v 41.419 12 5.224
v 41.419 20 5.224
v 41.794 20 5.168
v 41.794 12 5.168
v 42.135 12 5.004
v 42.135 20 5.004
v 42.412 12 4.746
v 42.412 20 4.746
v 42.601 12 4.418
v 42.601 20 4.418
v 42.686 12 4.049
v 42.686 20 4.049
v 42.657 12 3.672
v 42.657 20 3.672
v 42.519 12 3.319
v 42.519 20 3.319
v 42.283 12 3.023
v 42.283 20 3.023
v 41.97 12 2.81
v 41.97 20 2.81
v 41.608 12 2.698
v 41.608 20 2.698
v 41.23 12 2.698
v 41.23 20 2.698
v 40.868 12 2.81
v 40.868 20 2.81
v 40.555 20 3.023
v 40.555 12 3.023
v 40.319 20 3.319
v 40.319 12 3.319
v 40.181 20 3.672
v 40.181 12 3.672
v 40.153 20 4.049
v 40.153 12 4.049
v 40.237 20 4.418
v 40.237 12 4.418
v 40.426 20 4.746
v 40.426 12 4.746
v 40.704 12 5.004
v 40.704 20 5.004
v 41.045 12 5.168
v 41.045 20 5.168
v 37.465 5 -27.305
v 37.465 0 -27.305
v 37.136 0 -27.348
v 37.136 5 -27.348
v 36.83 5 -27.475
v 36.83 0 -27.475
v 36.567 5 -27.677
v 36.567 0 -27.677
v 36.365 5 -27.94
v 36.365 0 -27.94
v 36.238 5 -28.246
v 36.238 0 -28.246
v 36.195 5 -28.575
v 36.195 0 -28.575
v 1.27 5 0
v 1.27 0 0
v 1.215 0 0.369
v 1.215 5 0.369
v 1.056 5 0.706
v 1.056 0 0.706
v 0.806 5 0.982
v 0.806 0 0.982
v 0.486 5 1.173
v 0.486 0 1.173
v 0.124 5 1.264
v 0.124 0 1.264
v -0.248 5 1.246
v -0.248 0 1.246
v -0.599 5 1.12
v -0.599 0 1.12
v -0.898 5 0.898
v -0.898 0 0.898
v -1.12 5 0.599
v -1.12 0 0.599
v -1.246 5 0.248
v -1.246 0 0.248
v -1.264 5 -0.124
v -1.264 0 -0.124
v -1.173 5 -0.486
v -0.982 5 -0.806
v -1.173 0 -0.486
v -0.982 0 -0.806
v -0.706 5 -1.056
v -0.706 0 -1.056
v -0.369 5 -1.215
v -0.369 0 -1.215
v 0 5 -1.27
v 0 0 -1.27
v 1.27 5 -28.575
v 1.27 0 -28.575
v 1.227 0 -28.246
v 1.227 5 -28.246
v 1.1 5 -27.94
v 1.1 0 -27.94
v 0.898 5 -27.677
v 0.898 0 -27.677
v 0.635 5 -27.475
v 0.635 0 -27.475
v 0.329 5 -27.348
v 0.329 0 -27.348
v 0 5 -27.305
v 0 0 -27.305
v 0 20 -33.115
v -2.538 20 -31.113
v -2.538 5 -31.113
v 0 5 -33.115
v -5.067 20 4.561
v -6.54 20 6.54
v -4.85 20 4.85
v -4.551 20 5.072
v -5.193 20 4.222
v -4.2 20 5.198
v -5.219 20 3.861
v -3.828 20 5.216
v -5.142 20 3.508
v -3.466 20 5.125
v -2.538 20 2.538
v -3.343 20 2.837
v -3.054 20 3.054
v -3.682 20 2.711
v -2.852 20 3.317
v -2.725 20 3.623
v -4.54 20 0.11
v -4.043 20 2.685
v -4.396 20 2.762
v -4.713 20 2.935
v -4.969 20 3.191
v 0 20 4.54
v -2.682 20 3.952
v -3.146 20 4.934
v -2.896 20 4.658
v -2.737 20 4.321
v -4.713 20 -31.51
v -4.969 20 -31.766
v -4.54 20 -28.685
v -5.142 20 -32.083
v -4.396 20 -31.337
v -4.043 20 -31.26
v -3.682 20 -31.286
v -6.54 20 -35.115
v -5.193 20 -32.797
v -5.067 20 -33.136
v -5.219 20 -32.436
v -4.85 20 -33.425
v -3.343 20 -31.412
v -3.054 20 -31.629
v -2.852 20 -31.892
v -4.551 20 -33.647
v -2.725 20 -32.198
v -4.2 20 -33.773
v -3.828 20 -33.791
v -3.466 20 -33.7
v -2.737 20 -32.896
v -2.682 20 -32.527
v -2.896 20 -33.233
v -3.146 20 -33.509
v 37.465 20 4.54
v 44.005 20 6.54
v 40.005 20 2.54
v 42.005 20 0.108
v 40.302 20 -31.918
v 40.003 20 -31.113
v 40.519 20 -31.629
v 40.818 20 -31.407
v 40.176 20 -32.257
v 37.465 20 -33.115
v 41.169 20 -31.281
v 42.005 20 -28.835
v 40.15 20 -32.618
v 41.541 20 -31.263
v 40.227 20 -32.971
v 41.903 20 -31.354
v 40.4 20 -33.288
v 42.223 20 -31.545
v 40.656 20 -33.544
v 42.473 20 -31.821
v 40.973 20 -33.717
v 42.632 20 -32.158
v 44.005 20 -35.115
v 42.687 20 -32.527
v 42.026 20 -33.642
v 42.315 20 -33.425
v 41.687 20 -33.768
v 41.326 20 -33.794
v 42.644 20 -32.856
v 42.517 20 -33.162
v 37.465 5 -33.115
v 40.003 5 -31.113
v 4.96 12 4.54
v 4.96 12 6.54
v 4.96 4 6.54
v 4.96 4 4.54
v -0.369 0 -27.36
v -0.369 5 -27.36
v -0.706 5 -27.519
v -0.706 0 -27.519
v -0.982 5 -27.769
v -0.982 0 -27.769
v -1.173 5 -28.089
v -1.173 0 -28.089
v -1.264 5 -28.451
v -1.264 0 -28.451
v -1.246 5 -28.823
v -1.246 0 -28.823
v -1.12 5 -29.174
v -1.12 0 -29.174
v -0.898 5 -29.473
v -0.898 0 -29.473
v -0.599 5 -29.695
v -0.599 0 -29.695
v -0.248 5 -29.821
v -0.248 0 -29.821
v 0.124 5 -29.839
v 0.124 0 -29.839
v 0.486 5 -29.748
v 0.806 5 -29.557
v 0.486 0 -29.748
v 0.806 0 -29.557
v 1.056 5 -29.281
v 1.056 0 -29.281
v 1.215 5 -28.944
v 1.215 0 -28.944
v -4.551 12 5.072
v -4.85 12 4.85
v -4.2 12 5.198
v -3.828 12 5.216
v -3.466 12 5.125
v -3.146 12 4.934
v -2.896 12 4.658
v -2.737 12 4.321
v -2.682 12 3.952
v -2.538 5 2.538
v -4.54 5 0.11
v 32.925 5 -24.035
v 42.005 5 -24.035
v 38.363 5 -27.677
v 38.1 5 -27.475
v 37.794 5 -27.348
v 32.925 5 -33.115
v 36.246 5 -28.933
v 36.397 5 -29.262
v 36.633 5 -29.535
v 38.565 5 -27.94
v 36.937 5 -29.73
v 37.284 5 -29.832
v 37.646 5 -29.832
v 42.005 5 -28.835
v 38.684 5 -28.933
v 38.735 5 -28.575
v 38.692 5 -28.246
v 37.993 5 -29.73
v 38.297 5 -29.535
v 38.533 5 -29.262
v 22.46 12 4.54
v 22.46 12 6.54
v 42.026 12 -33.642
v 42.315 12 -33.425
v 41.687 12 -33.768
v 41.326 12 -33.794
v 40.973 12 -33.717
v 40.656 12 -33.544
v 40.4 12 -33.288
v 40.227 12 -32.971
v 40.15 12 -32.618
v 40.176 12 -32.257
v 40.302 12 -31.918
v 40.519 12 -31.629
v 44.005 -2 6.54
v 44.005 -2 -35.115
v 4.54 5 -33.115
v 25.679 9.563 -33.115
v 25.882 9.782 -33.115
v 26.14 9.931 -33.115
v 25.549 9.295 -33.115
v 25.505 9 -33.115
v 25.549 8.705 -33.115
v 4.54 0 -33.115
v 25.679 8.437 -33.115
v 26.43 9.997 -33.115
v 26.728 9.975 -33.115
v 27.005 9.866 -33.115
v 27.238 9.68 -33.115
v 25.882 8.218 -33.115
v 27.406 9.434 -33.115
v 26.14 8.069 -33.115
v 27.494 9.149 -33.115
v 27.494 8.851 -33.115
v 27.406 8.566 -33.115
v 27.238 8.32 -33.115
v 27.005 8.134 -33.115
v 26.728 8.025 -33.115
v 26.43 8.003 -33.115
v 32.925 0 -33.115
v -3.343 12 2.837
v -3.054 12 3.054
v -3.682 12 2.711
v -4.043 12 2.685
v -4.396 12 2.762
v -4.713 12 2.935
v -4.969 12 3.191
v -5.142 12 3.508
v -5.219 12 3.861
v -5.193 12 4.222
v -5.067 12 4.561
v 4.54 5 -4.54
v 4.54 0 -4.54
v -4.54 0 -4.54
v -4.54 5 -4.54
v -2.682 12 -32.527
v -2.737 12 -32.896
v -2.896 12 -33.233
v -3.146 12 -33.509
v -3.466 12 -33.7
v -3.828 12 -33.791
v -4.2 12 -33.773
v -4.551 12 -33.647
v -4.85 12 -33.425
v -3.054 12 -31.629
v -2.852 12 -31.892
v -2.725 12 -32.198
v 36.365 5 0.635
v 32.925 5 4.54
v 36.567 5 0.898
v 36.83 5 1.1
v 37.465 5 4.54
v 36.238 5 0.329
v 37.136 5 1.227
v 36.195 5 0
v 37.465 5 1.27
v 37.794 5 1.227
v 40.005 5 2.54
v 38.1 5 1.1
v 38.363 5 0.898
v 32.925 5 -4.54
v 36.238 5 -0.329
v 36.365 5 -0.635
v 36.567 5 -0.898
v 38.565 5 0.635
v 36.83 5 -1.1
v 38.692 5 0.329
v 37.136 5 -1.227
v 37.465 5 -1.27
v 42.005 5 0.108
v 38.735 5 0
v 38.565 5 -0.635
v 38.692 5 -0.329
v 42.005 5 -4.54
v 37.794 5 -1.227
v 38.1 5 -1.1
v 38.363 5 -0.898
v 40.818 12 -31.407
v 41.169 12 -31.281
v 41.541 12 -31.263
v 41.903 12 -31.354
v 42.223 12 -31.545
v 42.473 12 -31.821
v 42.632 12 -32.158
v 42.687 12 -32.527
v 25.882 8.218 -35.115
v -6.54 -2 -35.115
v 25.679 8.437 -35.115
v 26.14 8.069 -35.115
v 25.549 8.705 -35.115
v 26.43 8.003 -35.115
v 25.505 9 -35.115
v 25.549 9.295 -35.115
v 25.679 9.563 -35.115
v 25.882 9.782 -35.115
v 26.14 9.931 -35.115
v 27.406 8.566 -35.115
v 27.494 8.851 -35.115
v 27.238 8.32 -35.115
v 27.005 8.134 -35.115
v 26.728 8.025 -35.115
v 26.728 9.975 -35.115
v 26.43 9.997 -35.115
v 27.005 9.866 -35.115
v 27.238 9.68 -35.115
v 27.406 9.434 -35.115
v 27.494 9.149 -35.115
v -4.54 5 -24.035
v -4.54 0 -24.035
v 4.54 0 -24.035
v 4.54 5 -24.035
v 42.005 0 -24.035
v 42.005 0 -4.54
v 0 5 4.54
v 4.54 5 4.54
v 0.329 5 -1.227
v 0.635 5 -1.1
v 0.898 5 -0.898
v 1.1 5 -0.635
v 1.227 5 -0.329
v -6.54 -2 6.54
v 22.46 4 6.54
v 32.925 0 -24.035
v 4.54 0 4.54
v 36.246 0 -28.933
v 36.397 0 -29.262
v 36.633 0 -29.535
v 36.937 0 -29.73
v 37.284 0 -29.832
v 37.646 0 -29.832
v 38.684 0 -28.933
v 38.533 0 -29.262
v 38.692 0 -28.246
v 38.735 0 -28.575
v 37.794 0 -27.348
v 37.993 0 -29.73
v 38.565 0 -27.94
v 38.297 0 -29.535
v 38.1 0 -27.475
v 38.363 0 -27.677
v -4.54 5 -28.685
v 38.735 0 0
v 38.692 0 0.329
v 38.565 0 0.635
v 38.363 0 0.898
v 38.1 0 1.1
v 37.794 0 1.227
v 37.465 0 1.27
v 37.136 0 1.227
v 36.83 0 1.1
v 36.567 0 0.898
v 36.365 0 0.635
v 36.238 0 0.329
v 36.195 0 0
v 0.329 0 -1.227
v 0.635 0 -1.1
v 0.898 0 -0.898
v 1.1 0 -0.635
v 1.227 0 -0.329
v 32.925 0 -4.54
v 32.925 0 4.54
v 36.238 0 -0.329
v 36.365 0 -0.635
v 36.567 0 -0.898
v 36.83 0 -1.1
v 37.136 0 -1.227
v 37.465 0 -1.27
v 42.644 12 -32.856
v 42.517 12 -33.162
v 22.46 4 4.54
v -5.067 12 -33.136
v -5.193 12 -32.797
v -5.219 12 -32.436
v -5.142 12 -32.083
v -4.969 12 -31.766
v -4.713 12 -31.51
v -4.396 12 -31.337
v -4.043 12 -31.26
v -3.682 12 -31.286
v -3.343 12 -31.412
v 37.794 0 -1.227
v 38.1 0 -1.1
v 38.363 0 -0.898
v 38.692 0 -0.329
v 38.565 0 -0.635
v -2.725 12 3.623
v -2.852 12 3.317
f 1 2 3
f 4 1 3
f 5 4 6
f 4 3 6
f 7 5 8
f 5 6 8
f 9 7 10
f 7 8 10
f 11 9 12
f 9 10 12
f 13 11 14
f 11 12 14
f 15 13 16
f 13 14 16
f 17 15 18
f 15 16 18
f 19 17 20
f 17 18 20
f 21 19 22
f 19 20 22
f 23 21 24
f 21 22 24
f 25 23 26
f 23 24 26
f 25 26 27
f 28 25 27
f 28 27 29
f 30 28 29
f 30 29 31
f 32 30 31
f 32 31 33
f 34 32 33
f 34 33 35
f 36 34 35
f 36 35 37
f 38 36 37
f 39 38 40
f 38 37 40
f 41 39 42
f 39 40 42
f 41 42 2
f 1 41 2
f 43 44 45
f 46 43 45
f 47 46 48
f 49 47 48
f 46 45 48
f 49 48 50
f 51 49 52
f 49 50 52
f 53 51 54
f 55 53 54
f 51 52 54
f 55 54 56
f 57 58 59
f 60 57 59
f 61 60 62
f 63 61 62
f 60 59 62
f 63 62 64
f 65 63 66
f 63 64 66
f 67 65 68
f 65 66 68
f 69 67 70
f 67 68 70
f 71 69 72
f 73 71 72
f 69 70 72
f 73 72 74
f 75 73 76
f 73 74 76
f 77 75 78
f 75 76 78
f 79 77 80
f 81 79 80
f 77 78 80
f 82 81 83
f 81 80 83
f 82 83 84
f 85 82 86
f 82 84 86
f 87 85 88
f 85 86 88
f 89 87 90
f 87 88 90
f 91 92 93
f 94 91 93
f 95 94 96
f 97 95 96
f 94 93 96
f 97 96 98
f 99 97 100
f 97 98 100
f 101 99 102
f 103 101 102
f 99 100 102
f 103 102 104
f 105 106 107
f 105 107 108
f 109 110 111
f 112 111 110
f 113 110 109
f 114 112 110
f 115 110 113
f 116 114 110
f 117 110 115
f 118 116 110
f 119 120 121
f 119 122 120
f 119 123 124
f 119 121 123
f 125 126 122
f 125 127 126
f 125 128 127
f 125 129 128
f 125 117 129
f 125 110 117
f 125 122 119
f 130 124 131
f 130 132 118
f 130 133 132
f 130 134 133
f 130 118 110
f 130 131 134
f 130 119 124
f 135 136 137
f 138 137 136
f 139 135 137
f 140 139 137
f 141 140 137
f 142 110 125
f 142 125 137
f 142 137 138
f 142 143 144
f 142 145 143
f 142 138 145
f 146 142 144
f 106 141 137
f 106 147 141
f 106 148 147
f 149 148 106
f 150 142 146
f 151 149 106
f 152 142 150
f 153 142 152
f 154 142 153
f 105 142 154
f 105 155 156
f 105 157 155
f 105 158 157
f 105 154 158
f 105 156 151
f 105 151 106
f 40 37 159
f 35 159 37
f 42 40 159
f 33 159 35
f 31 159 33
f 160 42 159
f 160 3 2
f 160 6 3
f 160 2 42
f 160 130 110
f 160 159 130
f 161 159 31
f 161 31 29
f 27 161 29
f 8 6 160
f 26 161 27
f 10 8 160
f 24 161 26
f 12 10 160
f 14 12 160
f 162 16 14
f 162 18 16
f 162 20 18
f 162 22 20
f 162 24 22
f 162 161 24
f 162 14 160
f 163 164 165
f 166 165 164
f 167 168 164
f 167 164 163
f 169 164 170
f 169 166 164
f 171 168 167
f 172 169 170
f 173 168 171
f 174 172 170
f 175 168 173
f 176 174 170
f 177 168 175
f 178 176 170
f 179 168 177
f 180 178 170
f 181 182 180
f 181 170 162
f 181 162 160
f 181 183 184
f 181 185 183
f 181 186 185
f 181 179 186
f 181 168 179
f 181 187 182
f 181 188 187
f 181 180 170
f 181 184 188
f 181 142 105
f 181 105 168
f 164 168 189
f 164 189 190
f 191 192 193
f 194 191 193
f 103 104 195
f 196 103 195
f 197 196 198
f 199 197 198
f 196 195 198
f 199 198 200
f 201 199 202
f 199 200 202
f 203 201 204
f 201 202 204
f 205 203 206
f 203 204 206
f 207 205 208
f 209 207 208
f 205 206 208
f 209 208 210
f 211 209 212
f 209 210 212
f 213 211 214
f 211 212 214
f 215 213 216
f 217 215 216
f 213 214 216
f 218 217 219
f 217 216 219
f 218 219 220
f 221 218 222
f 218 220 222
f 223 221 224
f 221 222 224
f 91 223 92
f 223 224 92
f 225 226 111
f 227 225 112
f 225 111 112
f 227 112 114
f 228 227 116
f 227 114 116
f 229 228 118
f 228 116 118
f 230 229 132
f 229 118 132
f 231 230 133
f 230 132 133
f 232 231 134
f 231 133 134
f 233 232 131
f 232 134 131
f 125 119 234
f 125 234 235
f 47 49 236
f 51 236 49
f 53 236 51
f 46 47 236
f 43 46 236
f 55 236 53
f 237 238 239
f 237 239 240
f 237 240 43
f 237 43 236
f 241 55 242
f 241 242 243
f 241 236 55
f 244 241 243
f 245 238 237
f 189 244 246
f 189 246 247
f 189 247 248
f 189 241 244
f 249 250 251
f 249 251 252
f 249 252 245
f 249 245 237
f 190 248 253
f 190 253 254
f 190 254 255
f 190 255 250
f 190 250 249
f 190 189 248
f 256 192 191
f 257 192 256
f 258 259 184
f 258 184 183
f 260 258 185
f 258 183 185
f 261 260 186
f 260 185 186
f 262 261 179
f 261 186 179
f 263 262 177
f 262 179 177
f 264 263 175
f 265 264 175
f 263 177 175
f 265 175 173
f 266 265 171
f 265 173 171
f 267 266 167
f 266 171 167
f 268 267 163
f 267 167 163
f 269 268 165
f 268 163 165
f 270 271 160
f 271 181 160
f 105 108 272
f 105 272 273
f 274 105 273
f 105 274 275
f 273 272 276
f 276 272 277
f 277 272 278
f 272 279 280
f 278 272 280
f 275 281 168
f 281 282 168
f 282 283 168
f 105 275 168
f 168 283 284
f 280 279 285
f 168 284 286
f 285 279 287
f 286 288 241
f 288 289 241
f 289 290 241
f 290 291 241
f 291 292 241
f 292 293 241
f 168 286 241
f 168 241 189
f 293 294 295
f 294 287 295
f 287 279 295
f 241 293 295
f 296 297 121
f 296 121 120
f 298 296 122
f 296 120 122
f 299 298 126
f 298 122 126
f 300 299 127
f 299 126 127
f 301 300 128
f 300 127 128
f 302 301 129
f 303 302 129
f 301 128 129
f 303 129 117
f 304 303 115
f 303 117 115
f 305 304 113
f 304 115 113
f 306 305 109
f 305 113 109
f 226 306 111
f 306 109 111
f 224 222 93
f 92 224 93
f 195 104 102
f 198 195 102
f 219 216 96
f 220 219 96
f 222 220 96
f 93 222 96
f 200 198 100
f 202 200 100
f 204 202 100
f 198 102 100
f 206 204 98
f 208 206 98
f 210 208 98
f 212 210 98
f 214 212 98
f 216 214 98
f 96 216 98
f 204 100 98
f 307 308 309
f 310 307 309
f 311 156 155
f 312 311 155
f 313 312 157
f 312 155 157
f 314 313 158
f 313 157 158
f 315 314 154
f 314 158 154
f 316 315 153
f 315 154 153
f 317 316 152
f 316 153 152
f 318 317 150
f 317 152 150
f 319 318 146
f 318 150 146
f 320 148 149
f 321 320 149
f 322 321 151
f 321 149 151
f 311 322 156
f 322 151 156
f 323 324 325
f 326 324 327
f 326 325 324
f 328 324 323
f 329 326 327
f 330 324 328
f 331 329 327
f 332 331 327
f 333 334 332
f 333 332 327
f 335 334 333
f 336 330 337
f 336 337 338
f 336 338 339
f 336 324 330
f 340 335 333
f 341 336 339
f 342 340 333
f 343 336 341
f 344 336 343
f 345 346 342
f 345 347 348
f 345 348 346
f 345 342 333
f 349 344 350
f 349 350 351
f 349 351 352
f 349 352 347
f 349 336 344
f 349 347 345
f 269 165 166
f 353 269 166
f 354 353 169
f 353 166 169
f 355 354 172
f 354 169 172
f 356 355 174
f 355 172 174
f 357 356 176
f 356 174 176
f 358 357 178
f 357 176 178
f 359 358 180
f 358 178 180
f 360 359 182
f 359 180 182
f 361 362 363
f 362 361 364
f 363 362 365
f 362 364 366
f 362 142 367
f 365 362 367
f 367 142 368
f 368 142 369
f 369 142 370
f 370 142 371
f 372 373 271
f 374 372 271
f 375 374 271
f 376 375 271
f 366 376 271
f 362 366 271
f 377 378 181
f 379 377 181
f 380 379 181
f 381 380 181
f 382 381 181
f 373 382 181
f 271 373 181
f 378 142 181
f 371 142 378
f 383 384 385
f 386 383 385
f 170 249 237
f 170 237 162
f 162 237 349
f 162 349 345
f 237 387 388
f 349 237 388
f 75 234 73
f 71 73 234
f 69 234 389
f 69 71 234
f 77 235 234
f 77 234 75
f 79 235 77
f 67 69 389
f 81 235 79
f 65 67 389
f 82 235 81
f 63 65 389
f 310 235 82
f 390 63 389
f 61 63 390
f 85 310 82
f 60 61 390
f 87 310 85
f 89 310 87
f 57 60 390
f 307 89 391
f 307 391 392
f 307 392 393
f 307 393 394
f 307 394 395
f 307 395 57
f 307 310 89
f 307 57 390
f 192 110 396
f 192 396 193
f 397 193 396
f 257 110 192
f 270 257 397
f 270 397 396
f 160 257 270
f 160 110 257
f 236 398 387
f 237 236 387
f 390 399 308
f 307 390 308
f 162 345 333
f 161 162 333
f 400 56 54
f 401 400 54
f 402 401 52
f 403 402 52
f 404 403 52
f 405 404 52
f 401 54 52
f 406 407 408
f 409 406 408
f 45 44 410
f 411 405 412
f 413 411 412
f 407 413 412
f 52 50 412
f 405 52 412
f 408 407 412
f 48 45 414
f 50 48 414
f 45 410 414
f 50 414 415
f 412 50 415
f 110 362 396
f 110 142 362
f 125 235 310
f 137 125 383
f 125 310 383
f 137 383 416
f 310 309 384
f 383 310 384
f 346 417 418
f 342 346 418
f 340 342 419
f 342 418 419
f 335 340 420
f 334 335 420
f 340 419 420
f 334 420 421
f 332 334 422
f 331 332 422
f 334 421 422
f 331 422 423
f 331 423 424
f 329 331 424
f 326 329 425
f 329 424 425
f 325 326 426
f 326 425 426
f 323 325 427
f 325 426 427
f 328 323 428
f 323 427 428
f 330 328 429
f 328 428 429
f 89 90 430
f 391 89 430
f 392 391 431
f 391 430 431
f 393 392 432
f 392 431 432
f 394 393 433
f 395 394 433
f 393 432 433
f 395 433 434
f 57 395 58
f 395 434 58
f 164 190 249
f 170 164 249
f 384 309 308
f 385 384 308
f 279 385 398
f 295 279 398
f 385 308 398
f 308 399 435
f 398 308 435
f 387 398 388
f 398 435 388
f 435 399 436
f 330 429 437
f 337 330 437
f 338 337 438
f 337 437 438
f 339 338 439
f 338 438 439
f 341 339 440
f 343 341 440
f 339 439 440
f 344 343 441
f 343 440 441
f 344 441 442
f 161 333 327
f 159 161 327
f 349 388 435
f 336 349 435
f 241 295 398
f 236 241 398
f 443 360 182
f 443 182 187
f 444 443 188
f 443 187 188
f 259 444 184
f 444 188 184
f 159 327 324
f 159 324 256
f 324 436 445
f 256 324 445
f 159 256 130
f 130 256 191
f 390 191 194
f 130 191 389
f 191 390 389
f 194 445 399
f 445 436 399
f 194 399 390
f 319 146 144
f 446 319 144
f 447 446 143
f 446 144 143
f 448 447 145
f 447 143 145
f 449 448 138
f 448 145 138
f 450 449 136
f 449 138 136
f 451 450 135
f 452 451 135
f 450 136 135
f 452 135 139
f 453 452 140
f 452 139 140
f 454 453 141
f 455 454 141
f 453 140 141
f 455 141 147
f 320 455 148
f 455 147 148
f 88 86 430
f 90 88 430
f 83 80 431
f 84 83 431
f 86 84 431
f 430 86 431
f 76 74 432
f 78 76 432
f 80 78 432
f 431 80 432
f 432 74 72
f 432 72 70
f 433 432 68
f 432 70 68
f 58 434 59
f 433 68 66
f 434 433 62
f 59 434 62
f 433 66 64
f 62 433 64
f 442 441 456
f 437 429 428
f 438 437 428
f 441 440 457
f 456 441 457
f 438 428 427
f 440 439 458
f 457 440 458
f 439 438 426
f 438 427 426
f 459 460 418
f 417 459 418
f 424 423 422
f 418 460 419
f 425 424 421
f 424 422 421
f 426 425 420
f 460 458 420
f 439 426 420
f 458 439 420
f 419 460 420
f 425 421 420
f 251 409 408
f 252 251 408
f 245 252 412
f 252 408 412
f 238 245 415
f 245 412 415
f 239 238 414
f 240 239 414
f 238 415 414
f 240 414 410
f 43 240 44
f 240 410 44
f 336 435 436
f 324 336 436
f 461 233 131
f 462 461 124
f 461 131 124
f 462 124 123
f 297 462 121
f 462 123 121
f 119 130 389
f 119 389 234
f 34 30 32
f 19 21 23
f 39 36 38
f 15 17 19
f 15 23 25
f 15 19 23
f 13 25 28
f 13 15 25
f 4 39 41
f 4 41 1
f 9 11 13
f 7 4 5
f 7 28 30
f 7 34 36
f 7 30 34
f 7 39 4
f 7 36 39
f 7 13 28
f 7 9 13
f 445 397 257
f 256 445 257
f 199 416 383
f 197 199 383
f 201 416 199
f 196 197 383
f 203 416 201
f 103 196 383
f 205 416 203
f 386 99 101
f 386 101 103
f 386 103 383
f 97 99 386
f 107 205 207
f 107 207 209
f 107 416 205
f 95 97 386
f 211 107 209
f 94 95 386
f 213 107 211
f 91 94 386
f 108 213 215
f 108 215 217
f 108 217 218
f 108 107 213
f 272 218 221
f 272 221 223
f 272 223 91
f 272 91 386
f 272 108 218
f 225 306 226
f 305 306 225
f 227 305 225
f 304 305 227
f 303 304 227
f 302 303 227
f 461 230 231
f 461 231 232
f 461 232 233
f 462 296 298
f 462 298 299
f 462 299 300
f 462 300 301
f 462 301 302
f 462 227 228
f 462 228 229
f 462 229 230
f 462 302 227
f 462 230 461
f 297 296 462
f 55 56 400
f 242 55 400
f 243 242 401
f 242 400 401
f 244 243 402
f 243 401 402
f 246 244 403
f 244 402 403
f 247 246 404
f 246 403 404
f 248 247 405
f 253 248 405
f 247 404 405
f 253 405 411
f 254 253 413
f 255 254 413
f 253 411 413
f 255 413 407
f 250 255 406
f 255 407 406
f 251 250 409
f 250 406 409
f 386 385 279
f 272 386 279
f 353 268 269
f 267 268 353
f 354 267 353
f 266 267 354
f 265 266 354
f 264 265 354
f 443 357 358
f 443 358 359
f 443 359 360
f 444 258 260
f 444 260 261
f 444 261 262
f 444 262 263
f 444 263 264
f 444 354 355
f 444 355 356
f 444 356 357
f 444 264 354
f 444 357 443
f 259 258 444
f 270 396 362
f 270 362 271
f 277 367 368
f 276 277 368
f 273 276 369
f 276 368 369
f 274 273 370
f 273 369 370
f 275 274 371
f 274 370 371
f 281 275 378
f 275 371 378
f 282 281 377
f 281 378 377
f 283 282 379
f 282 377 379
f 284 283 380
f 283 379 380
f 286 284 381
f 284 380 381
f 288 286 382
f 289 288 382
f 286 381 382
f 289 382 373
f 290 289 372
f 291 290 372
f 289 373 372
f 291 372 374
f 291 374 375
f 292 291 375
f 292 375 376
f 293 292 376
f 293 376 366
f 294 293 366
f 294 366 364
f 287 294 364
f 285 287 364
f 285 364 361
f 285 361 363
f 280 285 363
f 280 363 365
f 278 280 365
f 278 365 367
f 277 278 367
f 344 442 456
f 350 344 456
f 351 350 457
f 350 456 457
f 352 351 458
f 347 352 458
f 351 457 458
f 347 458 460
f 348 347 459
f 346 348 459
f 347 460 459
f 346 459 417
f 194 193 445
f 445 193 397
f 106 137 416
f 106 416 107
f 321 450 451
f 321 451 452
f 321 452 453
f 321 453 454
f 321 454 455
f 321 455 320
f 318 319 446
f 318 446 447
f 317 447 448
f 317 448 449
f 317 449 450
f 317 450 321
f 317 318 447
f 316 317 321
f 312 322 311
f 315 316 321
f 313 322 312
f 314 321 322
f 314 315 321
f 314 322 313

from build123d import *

# Parameters (mm, degrees)
SKETCH2_W            = 2
SKETCH2_H            = 2
BOSS_EXTRUDE3_DEPTH  = 20
SKETCH3_W            = 9.08
SKETCH3_H            = 9.08
CUT_EXTRUDE1_DEPTH   = 15
SKETCH4_W            = 9.08
SKETCH4_H            = 9.08
CUT_EXTRUDE2_DEPTH   = 15
SKETCH5_W            = 9.08
SKETCH5_H            = 9.08
CUT_EXTRUDE3_DEPTH   = 15
SKETCH6_W            = 9.08
SKETCH6_H            = 9.08
CUT_EXTRUDE4_DEPTH   = 15
SKETCH7_W            = 50.545
SKETCH7_H            = 41.655
BOSS_EXTRUDE4_DEPTH  = 2
SKETCH9_W            = 17.5
SKETCH9_H            = 4
CUT_EXTRUDE8_DEPTH   = 10
BOSS_EXTRUDE5_DEPTH  = 15
SKETCH11_R           = 1.27
CUT_EXTRUDE9_DEPTH   = 8
BOSS_EXTRUDE9_DEPTH  = 18
CUT_EXTRUDE12_DEPTH  = 8
BOSS_EXTRUDE10_DEPTH = 18
CUT_EXTRUDE13_DEPTH  = 8
BOSS_EXTRUDE11_DEPTH = 18
CUT_EXTRUDE14_DEPTH  = 8
SKETCH22_R           = 1
CUT_EXTRUDE16_DEPTH  = 8


with BuildPart() as part:
    # Sketch2 → Boss-Extrude3 (new body)
    with BuildSketch(Plane(origin=(0, 0, 0), x_dir=(1, 0, 0), z_dir=(0, 1, 0))):
        Polygon((42.005, 24.035), (42.005, 33.115), (44.005, 33.115), (44.005, -4.54), (42.005, -4.54), (42.005, 4.54), align=None)
        with Locations((43.005, -5.54)):
            Rectangle(SKETCH2_W, SKETCH2_H)
        Polygon((4.54, -4.54), (32.925, -4.54), (37.465, -4.54), (42.005, -4.54), (42.005, -6.54), (-4.54, -6.54), (-4.54, -4.54), align=None)
        with Locations((-5.54, -5.54)):
            Rectangle(SKETCH2_W, SKETCH2_H)
        Polygon((-4.54, 24.035), (-4.54, 4.54), (-4.54, -4.54), (-6.54, -4.54), (-6.54, 33.115), (-4.54, 33.115), align=None)
        with Locations((-5.54, 34.115)):
            Rectangle(SKETCH2_W, SKETCH2_H)
        Polygon((4.54, 33.115), (-4.54, 33.115), (-4.54, 35.115), (42.005, 35.115), (42.005, 33.115), (32.925, 33.115), align=None)
        with Locations((43.005, 34.115)):
            Rectangle(SKETCH2_W, SKETCH2_H)
        with BuildLine():
            Line((37.465, 27.305), (37.465, 24.035))
            Line((37.465, 24.035), (42.005, 24.035))
            Line((42.005, 24.035), (42.005, 33.115))
            Line((42.005, 33.115), (32.925, 33.115))
            Line((32.925, 33.115), (32.925, 28.575))
            Line((32.925, 28.575), (36.195, 28.575))
            ThreePointArc((36.195, 28.575), (37.465, 29.845), (38.735, 28.575))
            ThreePointArc((38.735, 28.575), (38.363025612, 27.676974388), (37.465, 27.305))
        make_face()
        with BuildLine():
            Line((32.925, 24.035), (37.465, 24.035))
            Line((37.465, 24.035), (37.465, 27.305))
            ThreePointArc((37.465, 27.305), (36.566974388, 27.676974388), (36.195, 28.575))
            Line((36.195, 28.575), (32.925, 28.575))
            Line((32.925, 28.575), (32.925, 24.035))
        make_face()
        with BuildLine():
            Line((37.465, 4.54), (37.465, 1.27))
            ThreePointArc((37.465, 1.27), (38.363025612, 0.898025612), (38.735, 0))
            ThreePointArc((38.735, 0), (38.363025612, -0.898025612), (37.465, -1.27))
            Line((37.465, -1.27), (37.465, -4.54))
            Line((37.465, -4.54), (42.005, -4.54))
            Line((42.005, -4.54), (42.005, 4.54))
            Line((42.005, 4.54), (37.465, 4.54))
        make_face()
        with BuildLine():
            Line((32.925, 4.54), (32.925, 0))
            Line((32.925, 0), (36.195, 0))
            ThreePointArc((36.195, 0), (36.566974388, 0.898025612), (37.465, 1.27))
            Line((37.465, 1.27), (37.465, 4.54))
            Line((37.465, 4.54), (32.925, 4.54))
        make_face()
        with BuildLine():
            Line((36.195, 0), (32.925, 0))
            Line((32.925, 0), (32.925, -4.54))
            Line((32.925, -4.54), (37.465, -4.54))
            Line((37.465, -4.54), (37.465, -1.27))
            ThreePointArc((37.465, -1.27), (36.566974388, -0.898025612), (36.195, 0))
        make_face()
        with BuildLine():
            Line((0, 27.305), (0, 24.035))
            Line((0, 24.035), (4.54, 24.035))
            Line((4.54, 24.035), (4.54, 28.575))
            Line((4.54, 28.575), (1.27, 28.575))
            ThreePointArc((1.27, 28.575), (0.898025612, 27.676974388), (0, 27.305))
        make_face()
        with BuildLine():
            Line((-4.54, 24.035), (0, 24.035))
            Line((0, 24.035), (0, 27.305))
            ThreePointArc((0, 27.305), (-0.898025612, 29.473025612), (1.27, 28.575))
            Line((1.27, 28.575), (4.54, 28.575))
            Line((4.54, 28.575), (4.54, 33.115))
            Line((4.54, 33.115), (-4.54, 33.115))
            Line((-4.54, 33.115), (-4.54, 24.035))
        make_face()
        with BuildLine():
            ThreePointArc((0, 1.27), (0.898025612, 0.898025612), (1.27, 0))
            Line((1.27, 0), (4.54, 0))
            Line((4.54, 0), (4.54, 4.54))
            Line((4.54, 4.54), (0, 4.54))
            Line((0, 4.54), (0, 1.27))
        make_face()
        with BuildLine():
            Line((4.54, 0), (1.27, 0))
            ThreePointArc((1.27, 0), (-0.898025612, -0.898025612), (0, 1.27))
            Line((0, 1.27), (0, 4.54))
            Line((0, 4.54), (-4.54, 4.54))
            Line((-4.54, 4.54), (-4.54, -4.54))
            Line((-4.54, -4.54), (4.54, -4.54))
            Line((4.54, -4.54), (4.54, 0))
        make_face()
    extrude(amount=BOSS_EXTRUDE3_DEPTH)

    # Sketch3 → Cut-Extrude1 (cut)
    with BuildSketch(Plane(origin=(0, 20, 0), x_dir=(1, 0, 0), z_dir=(0, 1, 0))):
        with Locations((37.465, 28.575)):
            Rectangle(SKETCH3_W, SKETCH3_H)
    extrude(amount=-CUT_EXTRUDE1_DEPTH, mode=Mode.SUBTRACT)

    # Sketch4 → Cut-Extrude2 (cut)
    with BuildSketch(Plane(origin=(0, 20, 0), x_dir=(1, 0, 0), z_dir=(0, 1, 0))):
        with Locations((0, 28.575)):
            Rectangle(SKETCH4_W, SKETCH4_H)
    extrude(amount=-CUT_EXTRUDE2_DEPTH, mode=Mode.SUBTRACT)

    # Sketch5 → Cut-Extrude3 (cut)
    with BuildSketch(Plane(origin=(0, 20, 0), x_dir=(1, 0, 0), z_dir=(0, 1, 0))):
        with Locations((37.465, 0)):
            Rectangle(SKETCH5_W, SKETCH5_H)
    extrude(amount=-CUT_EXTRUDE3_DEPTH, mode=Mode.SUBTRACT)

    # Sketch6 → Cut-Extrude4 (cut)
    with BuildSketch(Plane(origin=(0, 20, 0), x_dir=(1, 0, 0), z_dir=(0, 1, 0))):
        Rectangle(SKETCH6_W, SKETCH6_H)
    extrude(amount=-CUT_EXTRUDE4_DEPTH, mode=Mode.SUBTRACT)

    # Sketch7 → Boss-Extrude4 (add)
    with BuildSketch(Plane.XZ):
        with Locations((18.7325, -14.2875)):
            Rectangle(SKETCH7_W, SKETCH7_H)
    extrude(amount=BOSS_EXTRUDE4_DEPTH)

    # Sketch9 → Cut-Extrude8 (cut)
    with BuildSketch(Plane.XY.offset(6.54)):
        with Locations((13.71, 10)):
            Rectangle(SKETCH9_W, SKETCH9_H)
        with Locations((13.71, 6)):
            Rectangle(SKETCH9_W, SKETCH9_H)
    extrude(amount=-CUT_EXTRUDE8_DEPTH, mode=Mode.SUBTRACT)

    # Sketch10 → Boss-Extrude5 (add)
    with BuildSketch(Plane(origin=(0, 5, 0), x_dir=(1, 0, 0), z_dir=(0, 1, 0))):
        Polygon((42.005, -0.108012912), (40.005, -2.54), (42.005, -2.54), align=None)
        Polygon((42.005, -2.54), (40.005, -2.54), (37.465, -4.54), (42.005, -4.54), align=None)
    extrude(amount=BOSS_EXTRUDE5_DEPTH)

    # Sketch11 → Cut-Extrude9 (cut)
    with BuildSketch(Plane(origin=(0, 20, 0), x_dir=(1, 0, 0), z_dir=(0, 1, 0))):
        with Locations(Location((41.419213562, -3.954213562, 0), (0, 0, 270))):
            Circle(SKETCH11_R)
    extrude(amount=-CUT_EXTRUDE9_DEPTH, mode=Mode.SUBTRACT)

    # Sketch12 → Boss-Extrude9 (add)
    with BuildSketch(Plane(origin=(0, 20, 0), x_dir=(1, 0, 0), z_dir=(0, 1, 0))):
        with BuildLine():
            Line((37.465, 33.115), (40.002775618, 31.112775618))
            Line((40.002775618, 31.112775618), (40.516974388, 31.626974388))
            ThreePointArc((40.516974388, 31.626974388), (40.15947529, 32.333799314), (40.290366726, 33.115))
            Line((40.290366726, 33.115), (37.465, 33.115))
        make_face()
        with BuildLine():
            Line((40.002775618, 31.112775618), (42.005, 28.835))
            Line((42.005, 28.835), (42.005, 31.400366726))
            ThreePointArc((42.005, 31.400366726), (41.223799314, 31.26947529), (40.516974388, 31.626974388))
            Line((40.516974388, 31.626974388), (40.002775618, 31.112775618))
        make_face()
        Polygon((41.415, 32.525), (42.005, 32.525), (42.005, 33.115), align=None)
        Polygon((41.415, 33.115), (41.415, 32.525), (42.005, 33.115), align=None)
        with BuildLine():
            ThreePointArc((40.516974388, 31.626974388), (41.223799314, 31.26947529), (42.005, 31.400366726))
            Line((42.005, 31.400366726), (42.005, 32.525))
            Line((42.005, 32.525), (41.415, 32.525))
            Line((41.415, 32.525), (40.516974388, 31.626974388))
        make_face()
        with BuildLine():
            Line((42.005, 32.525), (42.685, 32.525))
            ThreePointArc((42.685, 32.525), (42.588327006, 33.011007959), (42.313025612, 33.423025612))
            Line((42.313025612, 33.423025612), (42.005, 33.115))
            Line((42.005, 33.115), (42.005, 32.525))
        make_face()
        with BuildLine():
            ThreePointArc((40.290366726, 33.115), (40.15947529, 32.333799314), (40.516974388, 31.626974388))
            Line((40.516974388, 31.626974388), (41.415, 32.525))
            Line((41.415, 32.525), (41.415, 33.115))
            Line((41.415, 33.115), (40.290366726, 33.115))
        make_face()
        with BuildLine():
            Line((42.005, 33.115), (42.313025612, 33.423025612))
            ThreePointArc((42.313025612, 33.423025612), (41.901007959, 33.698327006), (41.415, 33.795))
            Line((41.415, 33.795), (41.415, 33.115))
            Line((41.415, 33.115), (42.005, 33.115))
        make_face()
    extrude(amount=-BOSS_EXTRUDE9_DEPTH)

    # Sketch17 → Cut-Extrude12 (cut)
    with BuildSketch(Plane(origin=(0, 20, 0), x_dir=(1, 0, 0), z_dir=(0, 1, 0))):
        with BuildLine():
            ThreePointArc((42.686989181, 32.526989181), (42.590316187, 33.01299714), (42.315014793, 33.425014793))
            Line((42.315014793, 33.425014793), (41.416989181, 32.526989181))
            Line((41.416989181, 32.526989181), (40.518963569, 31.628963569))
            ThreePointArc((40.518963569, 31.628963569), (41.90299714, 31.353662175), (42.686989181, 32.526989181))
        make_face()
        with BuildLine():
            Line((41.416989181, 32.526989181), (42.315014793, 33.425014793))
            ThreePointArc((42.315014793, 33.425014793), (40.518963569, 33.425014793), (40.518963569, 31.628963569))
            Line((40.518963569, 31.628963569), (41.416989181, 32.526989181))
        make_face()
    extrude(amount=-CUT_EXTRUDE12_DEPTH, mode=Mode.SUBTRACT)

    # Sketch18 → Boss-Extrude10 (add)
    with BuildSketch(Plane(origin=(0, 20, 0), x_dir=(1, 0, 0), z_dir=(0, 1, 0))):
        Polygon((-4.54, -0.11), (-4.54, -4.54), (-2.537775618, -2.537775618), align=None)
        Polygon((-2.537775618, -2.537775618), (-4.54, -4.54), (0, -4.54), align=None)
    extrude(amount=-BOSS_EXTRUDE10_DEPTH)

    # Sketch19 → Cut-Extrude13 (cut)
    with BuildSketch(Plane(origin=(0, 20, 0), x_dir=(1, 0, 0), z_dir=(0, 1, 0))):
        with BuildLine():
            ThreePointArc((-3.053963569, -3.053963569), (-4.850014793, -3.053963569), (-4.850014793, -4.850014793))
            Line((-4.850014793, -4.850014793), (-3.951989181, -3.951989181))
            Line((-3.951989181, -3.951989181), (-3.053963569, -3.053963569))
        make_face()
        with BuildLine():
            Line((-3.951989181, -3.951989181), (-4.850014793, -4.850014793))
            ThreePointArc((-4.850014793, -4.850014793), (-3.465981222, -5.125316187), (-2.681989181, -3.951989181))
            ThreePointArc((-2.681989181, -3.951989181), (-2.778662175, -3.465981222), (-3.053963569, -3.053963569))
            Line((-3.053963569, -3.053963569), (-3.951989181, -3.951989181))
        make_face()
    extrude(amount=-CUT_EXTRUDE13_DEPTH, mode=Mode.SUBTRACT)

    # Sketch20 → Boss-Extrude11 (add)
    with BuildSketch(Plane(origin=(0, 20, 0), x_dir=(1, 0, 0), z_dir=(0, 1, 0))):
        Polygon((0, 33.115), (-4.54, 33.115), (-2.537775618, 31.112775618), align=None)
        Polygon((-2.537775618, 31.112775618), (-4.54, 33.115), (-4.54, 28.685), align=None)
    extrude(amount=-BOSS_EXTRUDE11_DEPTH)

    # Sketch21 → Cut-Extrude14 (cut)
    with BuildSketch(Plane(origin=(0, 20, 0), x_dir=(1, 0, 0), z_dir=(0, 1, 0))):
        with BuildLine():
            ThreePointArc((-2.681989181, 32.526989181), (-3.465981222, 33.700316187), (-4.850014793, 33.425014793))
            Line((-4.850014793, 33.425014793), (-3.951989181, 32.526989181))
            Line((-3.951989181, 32.526989181), (-3.053963569, 31.628963569))
            ThreePointArc((-3.053963569, 31.628963569), (-2.778662175, 32.040981222), (-2.681989181, 32.526989181))
        make_face()
        with BuildLine():
            Line((-3.951989181, 32.526989181), (-4.850014793, 33.425014793))
            ThreePointArc((-4.850014793, 33.425014793), (-4.850014793, 31.628963569), (-3.053963569, 31.628963569))
            Line((-3.053963569, 31.628963569), (-3.951989181, 32.526989181))
        make_face()
    extrude(amount=-CUT_EXTRUDE14_DEPTH, mode=Mode.SUBTRACT)

    # Sketch22 → Cut-Extrude16 (cut)
    with BuildSketch(Plane(origin=(0, 0, -35.115), x_dir=(-1, 0, 0), z_dir=(0, 0, -1))):
        with Locations((-26.505, 9)):
            Circle(SKETCH22_R)
    extrude(amount=-CUT_EXTRUDE16_DEPTH, mode=Mode.SUBTRACT)


solid = part.part
